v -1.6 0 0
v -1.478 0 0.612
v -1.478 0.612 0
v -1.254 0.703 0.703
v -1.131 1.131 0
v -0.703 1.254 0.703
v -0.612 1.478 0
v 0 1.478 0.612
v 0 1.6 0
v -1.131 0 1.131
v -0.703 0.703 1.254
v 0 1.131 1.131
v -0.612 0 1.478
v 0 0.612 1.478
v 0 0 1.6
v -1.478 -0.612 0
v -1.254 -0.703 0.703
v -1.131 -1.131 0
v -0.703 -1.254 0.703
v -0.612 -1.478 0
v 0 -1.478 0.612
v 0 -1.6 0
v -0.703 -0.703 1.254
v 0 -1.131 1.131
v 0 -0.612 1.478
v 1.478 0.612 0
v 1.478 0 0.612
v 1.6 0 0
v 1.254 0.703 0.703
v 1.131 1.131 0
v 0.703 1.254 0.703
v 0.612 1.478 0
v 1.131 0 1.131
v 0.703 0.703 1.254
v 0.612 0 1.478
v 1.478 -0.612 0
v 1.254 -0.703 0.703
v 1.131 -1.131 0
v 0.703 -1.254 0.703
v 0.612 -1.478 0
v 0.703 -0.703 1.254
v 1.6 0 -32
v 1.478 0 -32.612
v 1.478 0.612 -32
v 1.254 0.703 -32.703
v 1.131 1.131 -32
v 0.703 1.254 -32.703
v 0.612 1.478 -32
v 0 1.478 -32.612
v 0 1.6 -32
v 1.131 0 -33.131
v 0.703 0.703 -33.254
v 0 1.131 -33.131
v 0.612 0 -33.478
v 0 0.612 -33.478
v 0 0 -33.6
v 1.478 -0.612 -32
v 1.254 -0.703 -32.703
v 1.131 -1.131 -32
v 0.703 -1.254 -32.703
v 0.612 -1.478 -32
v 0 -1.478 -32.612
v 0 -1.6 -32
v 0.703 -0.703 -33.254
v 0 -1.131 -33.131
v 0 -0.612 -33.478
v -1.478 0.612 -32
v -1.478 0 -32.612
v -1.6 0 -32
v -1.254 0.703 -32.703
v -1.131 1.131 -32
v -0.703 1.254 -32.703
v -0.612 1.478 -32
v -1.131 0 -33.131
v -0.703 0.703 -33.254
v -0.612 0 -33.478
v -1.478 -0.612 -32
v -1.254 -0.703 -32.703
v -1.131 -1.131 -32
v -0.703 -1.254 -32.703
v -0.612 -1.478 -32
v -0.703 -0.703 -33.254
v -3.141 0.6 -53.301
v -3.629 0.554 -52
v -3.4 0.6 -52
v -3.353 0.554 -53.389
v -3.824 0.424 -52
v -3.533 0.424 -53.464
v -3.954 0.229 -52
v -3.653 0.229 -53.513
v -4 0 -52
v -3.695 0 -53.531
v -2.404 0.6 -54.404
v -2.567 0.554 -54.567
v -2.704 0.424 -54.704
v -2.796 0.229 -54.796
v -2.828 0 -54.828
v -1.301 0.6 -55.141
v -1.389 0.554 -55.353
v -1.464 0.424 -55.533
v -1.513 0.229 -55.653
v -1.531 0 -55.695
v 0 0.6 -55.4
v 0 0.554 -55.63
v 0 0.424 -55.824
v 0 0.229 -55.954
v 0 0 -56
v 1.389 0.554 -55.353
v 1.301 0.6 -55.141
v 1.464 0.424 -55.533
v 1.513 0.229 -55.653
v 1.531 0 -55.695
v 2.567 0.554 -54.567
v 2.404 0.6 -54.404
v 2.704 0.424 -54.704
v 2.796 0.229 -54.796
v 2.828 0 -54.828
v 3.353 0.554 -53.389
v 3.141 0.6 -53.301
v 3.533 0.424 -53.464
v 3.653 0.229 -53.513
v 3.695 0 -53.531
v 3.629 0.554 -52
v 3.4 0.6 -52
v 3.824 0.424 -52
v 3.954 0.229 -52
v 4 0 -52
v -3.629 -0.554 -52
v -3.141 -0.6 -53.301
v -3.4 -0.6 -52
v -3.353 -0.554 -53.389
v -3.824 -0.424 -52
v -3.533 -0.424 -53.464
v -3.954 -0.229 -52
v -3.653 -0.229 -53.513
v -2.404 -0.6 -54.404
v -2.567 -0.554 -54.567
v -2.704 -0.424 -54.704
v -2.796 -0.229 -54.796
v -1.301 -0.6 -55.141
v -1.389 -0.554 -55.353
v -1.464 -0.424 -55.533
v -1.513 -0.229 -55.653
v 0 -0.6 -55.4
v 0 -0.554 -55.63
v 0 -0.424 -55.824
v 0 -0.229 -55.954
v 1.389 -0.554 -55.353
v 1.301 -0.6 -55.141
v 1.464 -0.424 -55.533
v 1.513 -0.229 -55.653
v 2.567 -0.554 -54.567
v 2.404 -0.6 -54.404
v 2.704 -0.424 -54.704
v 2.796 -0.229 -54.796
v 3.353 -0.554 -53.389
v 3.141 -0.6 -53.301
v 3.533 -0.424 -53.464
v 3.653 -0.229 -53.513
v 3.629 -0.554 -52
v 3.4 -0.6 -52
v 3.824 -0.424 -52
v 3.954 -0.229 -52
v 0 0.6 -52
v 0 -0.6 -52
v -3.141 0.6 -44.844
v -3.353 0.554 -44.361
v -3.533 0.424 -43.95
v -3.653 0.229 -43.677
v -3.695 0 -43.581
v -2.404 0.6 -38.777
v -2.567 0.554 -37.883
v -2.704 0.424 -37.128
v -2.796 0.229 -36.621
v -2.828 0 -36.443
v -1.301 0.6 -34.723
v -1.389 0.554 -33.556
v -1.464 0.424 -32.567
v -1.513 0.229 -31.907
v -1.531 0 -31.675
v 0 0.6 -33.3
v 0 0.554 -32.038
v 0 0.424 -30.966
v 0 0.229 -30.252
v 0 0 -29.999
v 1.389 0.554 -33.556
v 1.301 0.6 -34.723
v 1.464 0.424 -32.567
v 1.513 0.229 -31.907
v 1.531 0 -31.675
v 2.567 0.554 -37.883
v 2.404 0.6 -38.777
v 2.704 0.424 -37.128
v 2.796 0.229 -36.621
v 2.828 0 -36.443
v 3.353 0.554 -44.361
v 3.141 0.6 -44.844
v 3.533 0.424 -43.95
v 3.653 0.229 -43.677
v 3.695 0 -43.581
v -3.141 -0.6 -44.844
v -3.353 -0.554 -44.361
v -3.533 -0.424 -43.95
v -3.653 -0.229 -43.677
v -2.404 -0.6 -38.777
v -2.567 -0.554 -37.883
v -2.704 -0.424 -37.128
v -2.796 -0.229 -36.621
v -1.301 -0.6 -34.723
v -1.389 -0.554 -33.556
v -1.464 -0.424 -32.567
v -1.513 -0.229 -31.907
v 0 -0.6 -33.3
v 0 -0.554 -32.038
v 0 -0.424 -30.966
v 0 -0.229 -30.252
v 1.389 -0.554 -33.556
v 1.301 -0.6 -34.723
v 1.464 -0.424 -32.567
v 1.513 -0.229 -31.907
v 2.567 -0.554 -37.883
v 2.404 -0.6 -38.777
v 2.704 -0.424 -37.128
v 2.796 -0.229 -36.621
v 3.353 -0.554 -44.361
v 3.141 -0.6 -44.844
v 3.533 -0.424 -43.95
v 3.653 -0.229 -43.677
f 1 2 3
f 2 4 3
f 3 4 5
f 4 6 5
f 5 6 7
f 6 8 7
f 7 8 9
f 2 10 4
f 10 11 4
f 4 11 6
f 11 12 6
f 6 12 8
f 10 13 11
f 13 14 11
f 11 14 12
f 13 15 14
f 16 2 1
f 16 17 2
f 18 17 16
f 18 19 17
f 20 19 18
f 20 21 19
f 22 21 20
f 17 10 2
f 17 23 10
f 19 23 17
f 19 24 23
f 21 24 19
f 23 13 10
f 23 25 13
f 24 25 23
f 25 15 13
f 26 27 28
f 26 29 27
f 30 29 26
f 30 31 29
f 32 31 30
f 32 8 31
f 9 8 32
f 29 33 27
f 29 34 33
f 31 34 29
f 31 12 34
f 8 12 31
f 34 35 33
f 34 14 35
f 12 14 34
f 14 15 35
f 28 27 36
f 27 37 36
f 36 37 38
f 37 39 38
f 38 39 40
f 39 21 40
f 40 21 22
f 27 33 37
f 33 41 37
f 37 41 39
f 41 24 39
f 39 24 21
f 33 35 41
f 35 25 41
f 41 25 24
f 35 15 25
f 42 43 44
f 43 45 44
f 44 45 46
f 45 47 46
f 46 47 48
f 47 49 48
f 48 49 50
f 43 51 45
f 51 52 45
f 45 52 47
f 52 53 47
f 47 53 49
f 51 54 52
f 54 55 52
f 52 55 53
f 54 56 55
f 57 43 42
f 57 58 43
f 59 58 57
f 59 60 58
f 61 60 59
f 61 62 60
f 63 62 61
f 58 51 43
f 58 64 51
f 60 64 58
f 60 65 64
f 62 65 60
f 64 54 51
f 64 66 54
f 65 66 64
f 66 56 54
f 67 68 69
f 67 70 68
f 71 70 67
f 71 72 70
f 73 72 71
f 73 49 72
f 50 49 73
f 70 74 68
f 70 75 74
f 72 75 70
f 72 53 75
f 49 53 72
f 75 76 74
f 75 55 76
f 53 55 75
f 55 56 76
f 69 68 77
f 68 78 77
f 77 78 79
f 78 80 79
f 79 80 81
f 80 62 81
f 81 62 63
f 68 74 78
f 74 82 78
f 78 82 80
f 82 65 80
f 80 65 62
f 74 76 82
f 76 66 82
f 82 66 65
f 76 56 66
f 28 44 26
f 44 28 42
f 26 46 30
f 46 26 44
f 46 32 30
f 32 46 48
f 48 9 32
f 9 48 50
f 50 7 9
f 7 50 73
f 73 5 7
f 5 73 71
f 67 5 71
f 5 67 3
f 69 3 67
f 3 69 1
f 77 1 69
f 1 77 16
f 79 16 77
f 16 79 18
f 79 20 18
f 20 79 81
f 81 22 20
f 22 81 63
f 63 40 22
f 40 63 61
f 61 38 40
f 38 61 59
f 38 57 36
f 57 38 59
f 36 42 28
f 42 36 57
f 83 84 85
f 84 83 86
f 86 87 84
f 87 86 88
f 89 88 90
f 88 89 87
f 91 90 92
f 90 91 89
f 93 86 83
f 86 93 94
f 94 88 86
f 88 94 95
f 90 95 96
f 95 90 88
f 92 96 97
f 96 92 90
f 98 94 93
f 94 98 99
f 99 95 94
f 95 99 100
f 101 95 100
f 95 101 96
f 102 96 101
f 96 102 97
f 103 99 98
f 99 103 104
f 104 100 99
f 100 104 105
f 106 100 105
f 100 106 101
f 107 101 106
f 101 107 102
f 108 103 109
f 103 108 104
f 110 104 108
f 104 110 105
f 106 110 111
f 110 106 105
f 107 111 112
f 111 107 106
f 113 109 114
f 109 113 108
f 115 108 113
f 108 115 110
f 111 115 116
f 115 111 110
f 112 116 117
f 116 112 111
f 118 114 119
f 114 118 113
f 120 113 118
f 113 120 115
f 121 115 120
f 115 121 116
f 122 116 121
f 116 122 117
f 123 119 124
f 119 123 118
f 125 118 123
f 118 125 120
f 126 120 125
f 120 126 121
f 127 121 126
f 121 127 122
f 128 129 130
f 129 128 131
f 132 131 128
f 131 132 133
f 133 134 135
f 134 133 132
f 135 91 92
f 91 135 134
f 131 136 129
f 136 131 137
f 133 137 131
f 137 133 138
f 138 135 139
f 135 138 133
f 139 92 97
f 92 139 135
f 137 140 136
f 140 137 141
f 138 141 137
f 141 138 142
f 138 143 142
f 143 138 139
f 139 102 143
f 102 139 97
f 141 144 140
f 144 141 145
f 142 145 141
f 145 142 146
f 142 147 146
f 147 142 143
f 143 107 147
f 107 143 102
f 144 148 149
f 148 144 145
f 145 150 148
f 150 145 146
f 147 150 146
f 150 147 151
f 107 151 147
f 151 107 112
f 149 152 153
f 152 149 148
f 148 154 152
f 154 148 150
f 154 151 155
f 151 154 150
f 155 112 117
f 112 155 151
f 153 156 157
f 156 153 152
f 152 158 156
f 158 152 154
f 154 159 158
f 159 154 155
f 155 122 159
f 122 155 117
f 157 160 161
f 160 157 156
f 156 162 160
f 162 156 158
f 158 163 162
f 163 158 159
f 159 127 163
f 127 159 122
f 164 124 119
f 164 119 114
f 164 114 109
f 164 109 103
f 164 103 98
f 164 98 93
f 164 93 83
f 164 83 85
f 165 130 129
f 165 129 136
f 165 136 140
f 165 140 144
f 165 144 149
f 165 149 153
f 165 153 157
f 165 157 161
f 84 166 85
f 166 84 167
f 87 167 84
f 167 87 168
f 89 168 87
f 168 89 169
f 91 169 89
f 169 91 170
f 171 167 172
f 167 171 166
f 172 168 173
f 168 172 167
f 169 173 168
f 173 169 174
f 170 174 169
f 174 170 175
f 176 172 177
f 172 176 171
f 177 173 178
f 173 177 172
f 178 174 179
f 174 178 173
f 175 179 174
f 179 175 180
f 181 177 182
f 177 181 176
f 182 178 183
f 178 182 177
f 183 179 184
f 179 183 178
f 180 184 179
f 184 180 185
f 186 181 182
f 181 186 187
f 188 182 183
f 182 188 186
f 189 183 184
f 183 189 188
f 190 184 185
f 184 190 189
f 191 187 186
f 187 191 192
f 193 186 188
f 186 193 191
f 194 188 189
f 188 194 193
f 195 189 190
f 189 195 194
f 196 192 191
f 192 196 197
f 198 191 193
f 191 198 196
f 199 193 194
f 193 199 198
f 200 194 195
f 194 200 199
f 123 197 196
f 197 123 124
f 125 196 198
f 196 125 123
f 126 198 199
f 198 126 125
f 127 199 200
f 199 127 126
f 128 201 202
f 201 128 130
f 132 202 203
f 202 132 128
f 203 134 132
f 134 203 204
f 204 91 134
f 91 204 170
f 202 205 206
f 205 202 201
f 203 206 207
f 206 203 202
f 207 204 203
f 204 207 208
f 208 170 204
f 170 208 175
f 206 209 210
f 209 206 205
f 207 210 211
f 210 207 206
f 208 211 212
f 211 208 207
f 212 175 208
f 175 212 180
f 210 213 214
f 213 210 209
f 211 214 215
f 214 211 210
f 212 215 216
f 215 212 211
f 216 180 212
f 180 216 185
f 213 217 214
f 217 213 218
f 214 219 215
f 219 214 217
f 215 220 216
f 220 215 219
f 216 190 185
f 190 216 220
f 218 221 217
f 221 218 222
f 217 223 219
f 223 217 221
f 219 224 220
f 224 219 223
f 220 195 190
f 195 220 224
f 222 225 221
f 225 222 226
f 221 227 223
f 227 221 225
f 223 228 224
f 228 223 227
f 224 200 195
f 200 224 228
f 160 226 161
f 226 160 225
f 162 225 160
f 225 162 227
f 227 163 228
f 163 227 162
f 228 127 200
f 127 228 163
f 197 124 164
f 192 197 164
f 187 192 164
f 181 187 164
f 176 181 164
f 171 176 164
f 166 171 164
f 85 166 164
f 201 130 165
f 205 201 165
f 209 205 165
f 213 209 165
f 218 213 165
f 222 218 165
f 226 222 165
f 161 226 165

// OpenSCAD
// file: ../p/1-8sphe.scad
use <../lib.scad>
function ldraw_lib__1_8sphe() = [
// 0 Sphere 0.125
// 0 Name: 1-8sphe.dat
// 0 Author: James Jessiman
// 0 !LDRAW_ORG Primitive UPDATE 2012-03
// 0 !LICENSE Licensed under CC BY 2.0 and CC BY 4.0 : see CAreadme.txt
// 
// 0 BFC CERTIFY CCW
  [0,"BFC","CERTIFY"],
  [0,"BFC","CCW"],
// 
// 0 !HISTORY 2000-08-01 {Axel Poque} fixes to resolve L3P error messages.
// 0 !HISTORY 2000-08-01 {Manfred Moolhuysen} fixes to resolve L3P error messages.
// 0 !HISTORY 2000-09-30 [PTadmin] Official Update 2000-02
// 0 !HISTORY 2002-03-28 [hafhead] Made BFC compliant
// 0 !HISTORY 2002-04-25 [PTadmin] Official Update 2002-02
// 0 !HISTORY 2007-06-22 [PTadmin] Header formatted for Contributor Agreement
// 0 !HISTORY 2008-07-01 [PTadmin] Official Update 2008-01
// 0 !HISTORY 2010-09-12 [MagFors] Changed winding, removed duplicated cond-line, optimized filesize
// 0 !HISTORY 2010-12-31 [PTadmin] Official Update 2010-03
// 0 !HISTORY 2012-07-01 [tcobbs] Replaced with geometry from LDView
// 0 !HISTORY 2012-12-28 [PTadmin] Official Update 2012-03
// 
// 
// 3 16 1 0 0 0.9239 0.3827 0 0.9239 0 0.3827
  [3,16,1,0,0,0.9239,0.3827,0,0.9239,0,0.3827],
// 3 16 0.9239 0.3827 0 0.7836 0.4393 0.4393 0.9239 0 0.3827
  [3,16,0.9239,0.3827,0,0.7836,0.4393,0.4393,0.9239,0,0.3827],
// 3 16 0.9239 0 0.3827 0.7836 0.4393 0.4393 0.7071 0 0.7071
  [3,16,0.9239,0,0.3827,0.7836,0.4393,0.4393,0.7071,0,0.7071],
// 3 16 0.7836 0.4393 0.4393 0.4393 0.4393 0.7836 0.7071 0 0.7071
  [3,16,0.7836,0.4393,0.4393,0.4393,0.4393,0.7836,0.7071,0,0.7071],
// 3 16 0.7071 0 0.7071 0.4393 0.4393 0.7836 0.3827 0 0.9239
  [3,16,0.7071,0,0.7071,0.4393,0.4393,0.7836,0.3827,0,0.9239],
// 3 16 0.4393 0.4393 0.7836 0 0.3827 0.9239 0.3827 0 0.9239
  [3,16,0.4393,0.4393,0.7836,0,0.3827,0.9239,0.3827,0,0.9239],
// 3 16 0.3827 0 0.9239 0 0.3827 0.9239 0 0 1
  [3,16,0.3827,0,0.9239,0,0.3827,0.9239,0,0,1],
// 3 16 0.9239 0.3827 0 0.7071 0.7071 0 0.7836 0.4393 0.4393
  [3,16,0.9239,0.3827,0,0.7071,0.7071,0,0.7836,0.4393,0.4393],
// 3 16 0.7071 0.7071 0 0.4393 0.7836 0.4393 0.7836 0.4393 0.4393
  [3,16,0.7071,0.7071,0,0.4393,0.7836,0.4393,0.7836,0.4393,0.4393],
// 3 16 0.7836 0.4393 0.4393 0.4393 0.7836 0.4393 0.4393 0.4393 0.7836
  [3,16,0.7836,0.4393,0.4393,0.4393,0.7836,0.4393,0.4393,0.4393,0.7836],
// 3 16 0.4393 0.7836 0.4393 0 0.7071 0.7071 0.4393 0.4393 0.7836
  [3,16,0.4393,0.7836,0.4393,0,0.7071,0.7071,0.4393,0.4393,0.7836],
// 3 16 0.4393 0.4393 0.7836 0 0.7071 0.7071 0 0.3827 0.9239
  [3,16,0.4393,0.4393,0.7836,0,0.7071,0.7071,0,0.3827,0.9239],
// 3 16 0.7071 0.7071 0 0.3827 0.9239 0 0.4393 0.7836 0.4393
  [3,16,0.7071,0.7071,0,0.3827,0.9239,0,0.4393,0.7836,0.4393],
// 3 16 0.3827 0.9239 0 0 0.9239 0.3827 0.4393 0.7836 0.4393
  [3,16,0.3827,0.9239,0,0,0.9239,0.3827,0.4393,0.7836,0.4393],
// 3 16 0.4393 0.7836 0.4393 0 0.9239 0.3827 0 0.7071 0.7071
  [3,16,0.4393,0.7836,0.4393,0,0.9239,0.3827,0,0.7071,0.7071],
// 3 16 0.3827 0.9239 0 0 1 0 0 0.9239 0.3827
  [3,16,0.3827,0.9239,0,0,1,0,0,0.9239,0.3827],
// 
// 5 24 1 0 0 0.9239 0.3827 0 1 0 -0.1 0.9239 0 0.3827
  [5,24,1,0,0,0.9239,0.3827,0,1,0,-0.1,0.9239,0,0.3827],
// 5 24 0.9239 0.3827 0 0.9239 0 0.3827 1 0 0 0.7836 0.4393 0.4393
  [5,24,0.9239,0.3827,0,0.9239,0,0.3827,1,0,0,0.7836,0.4393,0.4393],
// 5 24 1 0 0 0.9239 0 0.3827 0.9239 0.3827 0 1 -0.1 0
  [5,24,1,0,0,0.9239,0,0.3827,0.9239,0.3827,0,1,-0.1,0],
// 5 24 0.9239 0 0.3827 0.7836 0.4393 0.4393 0.9239 0.3827 0 0.7071 0 0.7071
  [5,24,0.9239,0,0.3827,0.7836,0.4393,0.4393,0.9239,0.3827,0,0.7071,0,0.7071],
// 5 24 0.7836 0.4393 0.4393 0.7071 0 0.7071 0.9239 0 0.3827 0.4393 0.4393 0.7836
  [5,24,0.7836,0.4393,0.4393,0.7071,0,0.7071,0.9239,0,0.3827,0.4393,0.4393,0.7836],
// 5 24 0.9239 0 0.3827 0.7071 0 0.7071 0.7836 0.4393 0.4393 0.9239 -0.1 0.3827
  [5,24,0.9239,0,0.3827,0.7071,0,0.7071,0.7836,0.4393,0.4393,0.9239,-0.1,0.3827],
// 5 24 0.7071 0 0.7071 0.4393 0.4393 0.7836 0.7836 0.4393 0.4393 0.3827 0 0.9239
  [5,24,0.7071,0,0.7071,0.4393,0.4393,0.7836,0.7836,0.4393,0.4393,0.3827,0,0.9239],
// 5 24 0.4393 0.4393 0.7836 0.3827 0 0.9239 0.7071 0 0.7071 0 0.3827 0.9239
  [5,24,0.4393,0.4393,0.7836,0.3827,0,0.9239,0.7071,0,0.7071,0,0.3827,0.9239],
// 5 24 0.7071 0 0.7071 0.3827 0 0.9239 0.4393 0.4393 0.7836 0.7071 -0.1 0.7071
  [5,24,0.7071,0,0.7071,0.3827,0,0.9239,0.4393,0.4393,0.7836,0.7071,-0.1,0.7071],
// 5 24 0.3827 0 0.9239 0 0.3827 0.9239 0.4393 0.4393 0.7836 0 0 1
  [5,24,0.3827,0,0.9239,0,0.3827,0.9239,0.4393,0.4393,0.7836,0,0,1],
// 5 24 0 0.3827 0.9239 0 0 1 0.3827 0 0.9239 -0.1 0.3827 0.9239
  [5,24,0,0.3827,0.9239,0,0,1,0.3827,0,0.9239,-0.1,0.3827,0.9239],
// 5 24 0.3827 0 0.9239 0 0 1 0 0.3827 0.9239 0.3827 -0.1 0.9239
  [5,24,0.3827,0,0.9239,0,0,1,0,0.3827,0.9239,0.3827,-0.1,0.9239],
// 5 24 0.9239 0.3827 0 0.7071 0.7071 0 0.9239 0.3827 -0.1 0.7836 0.4393 0.4393
  [5,24,0.9239,0.3827,0,0.7071,0.7071,0,0.9239,0.3827,-0.1,0.7836,0.4393,0.4393],
// 5 24 0.7071 0.7071 0 0.7836 0.4393 0.4393 0.9239 0.3827 0 0.4393 0.7836 0.4393
  [5,24,0.7071,0.7071,0,0.7836,0.4393,0.4393,0.9239,0.3827,0,0.4393,0.7836,0.4393],
// 5 24 0.9239 0.3827 0 0.7836 0.4393 0.4393 0.7071 0.7071 0 0.9239 0 0.3827
  [5,24,0.9239,0.3827,0,0.7836,0.4393,0.4393,0.7071,0.7071,0,0.9239,0,0.3827],
// 5 24 0.7836 0.4393 0.4393 0.4393 0.7836 0.4393 0.7071 0.7071 0 0.4393 0.4393 0.7836
  [5,24,0.7836,0.4393,0.4393,0.4393,0.7836,0.4393,0.7071,0.7071,0,0.4393,0.4393,0.7836],
// 5 24 0.4393 0.7836 0.4393 0.4393 0.4393 0.7836 0.7836 0.4393 0.4393 0 0.7071 0.7071
  [5,24,0.4393,0.7836,0.4393,0.4393,0.4393,0.7836,0.7836,0.4393,0.4393,0,0.7071,0.7071],
// 5 24 0.7836 0.4393 0.4393 0.4393 0.4393 0.7836 0.4393 0.7836 0.4393 0.7071 0 0.7071
  [5,24,0.7836,0.4393,0.4393,0.4393,0.4393,0.7836,0.4393,0.7836,0.4393,0.7071,0,0.7071],
// 5 24 0.4393 0.4393 0.7836 0 0.7071 0.7071 0.4393 0.7836 0.4393 0 0.3827 0.9239
  [5,24,0.4393,0.4393,0.7836,0,0.7071,0.7071,0.4393,0.7836,0.4393,0,0.3827,0.9239],
// 5 24 0 0.7071 0.7071 0 0.3827 0.9239 0.4393 0.4393 0.7836 -0.1 0.7071 0.7071
  [5,24,0,0.7071,0.7071,0,0.3827,0.9239,0.4393,0.4393,0.7836,-0.1,0.7071,0.7071],
// 5 24 0.4393 0.4393 0.7836 0 0.3827 0.9239 0 0.7071 0.7071 0.3827 0 0.9239
  [5,24,0.4393,0.4393,0.7836,0,0.3827,0.9239,0,0.7071,0.7071,0.3827,0,0.9239],
// 5 24 0.7071 0.7071 0 0.3827 0.9239 0 0.7071 0.7071 -0.1 0.4393 0.7836 0.4393
  [5,24,0.7071,0.7071,0,0.3827,0.9239,0,0.7071,0.7071,-0.1,0.4393,0.7836,0.4393],
// 5 24 0.3827 0.9239 0 0.4393 0.7836 0.4393 0.7071 0.7071 0 0 0.9239 0.3827
  [5,24,0.3827,0.9239,0,0.4393,0.7836,0.4393,0.7071,0.7071,0,0,0.9239,0.3827],
// 5 24 0.7071 0.7071 0 0.4393 0.7836 0.4393 0.3827 0.9239 0 0.7836 0.4393 0.4393
  [5,24,0.7071,0.7071,0,0.4393,0.7836,0.4393,0.3827,0.9239,0,0.7836,0.4393,0.4393],
// 5 24 0.4393 0.7836 0.4393 0 0.9239 0.3827 0.3827 0.9239 0 0 0.7071 0.7071
  [5,24,0.4393,0.7836,0.4393,0,0.9239,0.3827,0.3827,0.9239,0,0,0.7071,0.7071],
// 5 24 0 0.9239 0.3827 0 0.7071 0.7071 0.4393 0.7836 0.4393 -0.1 0.9239 0.3827
  [5,24,0,0.9239,0.3827,0,0.7071,0.7071,0.4393,0.7836,0.4393,-0.1,0.9239,0.3827],
// 5 24 0.4393 0.7836 0.4393 0 0.7071 0.7071 0 0.9239 0.3827 0.4393 0.4393 0.7836
  [5,24,0.4393,0.7836,0.4393,0,0.7071,0.7071,0,0.9239,0.3827,0.4393,0.4393,0.7836],
// 5 24 0.3827 0.9239 0 0 1 0 0.3827 0.9239 -0.1 0 0.9239 0.3827
  [5,24,0.3827,0.9239,0,0,1,0,0.3827,0.9239,-0.1,0,0.9239,0.3827],
// 5 24 0 1 0 0 0.9239 0.3827 0.3827 0.9239 0 -0.1 1 0
  [5,24,0,1,0,0,0.9239,0.3827,0.3827,0.9239,0,-0.1,1,0],
// 5 24 0.3827 0.9239 0 0 0.9239 0.3827 0 1 0 0.4393 0.7836 0.4393
  [5,24,0.3827,0.9239,0,0,0.9239,0.3827,0,1,0,0.4393,0.7836,0.4393],
];
module ldraw_lib__1_8sphe(step=0, col=false, unit=2/5, alt=false, line=0.2, solid=!$preview)
    makepoly(ldraw_lib__1_8sphe(), step=step, col=col, unit=unit, alt=alt, line=line, solid=solid);
ldraw_lib__1_8sphe(line=0.2);
// file: ../p/4-8sphe.scad
use <../lib.scad>
use <1-8sphe.scad>
function ldraw_lib__4_8sphe() = [
// 0 Sphere 0.5
// 0 Name: 4-8sphe.dat
// 0 Author: James Jessiman
// 0 !LDRAW_ORG Primitive UPDATE 2003-02
// 0 !LICENSE Licensed under CC BY 2.0 and CC BY 4.0 : see CAreadme.txt
// 
// 0 BFC CERTIFY CCW
  [0,"BFC","CERTIFY"],
  [0,"BFC","CCW"],
// 
// 0 !HISTORY 2002-08-31 [izanette] Modified with WINDZ for BFC compliance
// 0 !HISTORY 2003-08-01 [PTadmin] Official Update 2003-02
// 0 !HISTORY 2007-06-24 [PTadmin] Header formatted for Contributor Agreement
// 0 !HISTORY 2008-07-01 [PTadmin] Official Update 2008-01
// 
// 
// 1 16 0 0 0 1 0 0 0 1 0 0 0 1 1-8sphe.dat
  [1,16,0,0,0,1,0,0,0,1,0,0,0,1, ldraw_lib__1_8sphe()],
// 1 16 0 0 0 1 0 0 0 1 0 0 0 -1 1-8sphe.dat
  [1,16,0,0,0,1,0,0,0,1,0,0,0,-1, ldraw_lib__1_8sphe()],
// 1 16 0 0 0 -1 0 0 0 1 0 0 0 1 1-8sphe.dat
  [1,16,0,0,0,-1,0,0,0,1,0,0,0,1, ldraw_lib__1_8sphe()],
// 1 16 0 0 0 -1 0 0 0 1 0 0 0 -1 1-8sphe.dat
  [1,16,0,0,0,-1,0,0,0,1,0,0,0,-1, ldraw_lib__1_8sphe()],
// 0
// 
];
module ldraw_lib__4_8sphe(step=0, col=false, unit=2/5, alt=false, line=0.2, solid=!$preview)
    makepoly(ldraw_lib__4_8sphe(), step=step, col=col, unit=unit, alt=alt, line=line, solid=solid);
ldraw_lib__4_8sphe(line=0.2);
// file: ../p/4-4cyli.scad
use <../lib.scad>
function ldraw_lib__4_4cyli() = [
// 0 Cylinder 1.0
// 0 Name: 4-4cyli.dat
// 0 Author: James Jessiman
// 0 !LDRAW_ORG Primitive UPDATE 2005-01
// 0 !LICENSE Licensed under CC BY 2.0 and CC BY 4.0 : see CAreadme.txt
// 
// 0 BFC CERTIFY CCW
  [0,"BFC","CERTIFY"],
  [0,"BFC","CCW"],
// 
// 0 !HISTORY 1998-12-15 [PTadmin] Official Update 1998-10
// 0 !HISTORY 2002-03-23 [sbliss] Added BFC statement; merged headers from files in distributions LDraw 0.27 and Complete.
// 0 !HISTORY 2002-04-25 [PTadmin] Official Update 2002-02
// 0 !HISTORY 2004-12-14 [guyvivan] BFC CCW
// 0 !HISTORY 2005-12-28 [PTadmin] Official Update 2005-01
// 0 !HISTORY 2007-06-24 [PTadmin] Header formatted for Contributor Agreement
// 0 !HISTORY 2008-07-01 [PTadmin] Official Update 2008-01
// 
// 
// 4 16 1 1 0 0.9239 1 0.3827 0.9239 0 0.3827 1 0 0
  [4,16,1,1,0,0.9239,1,0.3827,0.9239,0,0.3827,1,0,0],
// 5 24 1 0 0 1 1 0 0.9239 0 0.3827 0.9239 0 -0.3827
  [5,24,1,0,0,1,1,0,0.9239,0,0.3827,0.9239,0,-0.3827],
// 4 16 0.9239 1 0.3827 0.7071 1 0.7071 0.7071 0 0.7071 0.9239 0 0.3827
  [4,16,0.9239,1,0.3827,0.7071,1,0.7071,0.7071,0,0.7071,0.9239,0,0.3827],
// 5 24 0.9239 0 0.3827 0.9239 1 0.3827 0.7071 0 0.7071 1 0 0
  [5,24,0.9239,0,0.3827,0.9239,1,0.3827,0.7071,0,0.7071,1,0,0],
// 4 16 0.7071 1 0.7071 0.3827 1 0.9239 0.3827 0 0.9239 0.7071 0 0.7071
  [4,16,0.7071,1,0.7071,0.3827,1,0.9239,0.3827,0,0.9239,0.7071,0,0.7071],
// 5 24 0.7071 0 0.7071 0.7071 1 0.7071 0.3827 0 0.9239 0.9239 0 0.3827
  [5,24,0.7071,0,0.7071,0.7071,1,0.7071,0.3827,0,0.9239,0.9239,0,0.3827],
// 4 16 0.3827 1 0.9239 0 1 1 0 0 1 0.3827 0 0.9239
  [4,16,0.3827,1,0.9239,0,1,1,0,0,1,0.3827,0,0.9239],
// 5 24 0.3827 0 0.9239 0.3827 1 0.9239 0 0 1 0.7071 0 0.7071
  [5,24,0.3827,0,0.9239,0.3827,1,0.9239,0,0,1,0.7071,0,0.7071],
// 4 16 0 1 1 -0.3827 1 0.9239 -0.3827 0 0.9239 0 0 1
  [4,16,0,1,1,-0.3827,1,0.9239,-0.3827,0,0.9239,0,0,1],
// 5 24 0 0 1 0 1 1 -0.3827 0 0.9239 0.3827 0 0.9239
  [5,24,0,0,1,0,1,1,-0.3827,0,0.9239,0.3827,0,0.9239],
// 4 16 -0.3827 1 0.9239 -0.7071 1 0.7071 -0.7071 0 0.7071 -0.3827 0 0.9239
  [4,16,-0.3827,1,0.9239,-0.7071,1,0.7071,-0.7071,0,0.7071,-0.3827,0,0.9239],
// 5 24 -0.3827 0 0.9239 -0.3827 1 0.9239 -0.7071 0 0.7071 0 0 1
  [5,24,-0.3827,0,0.9239,-0.3827,1,0.9239,-0.7071,0,0.7071,0,0,1],
// 4 16 -0.7071 1 0.7071 -0.9239 1 0.3827 -0.9239 0 0.3827 -0.7071 0 0.7071
  [4,16,-0.7071,1,0.7071,-0.9239,1,0.3827,-0.9239,0,0.3827,-0.7071,0,0.7071],
// 5 24 -0.7071 0 0.7071 -0.7071 1 0.7071 -0.9239 0 0.3827 -0.3827 0 0.9239
  [5,24,-0.7071,0,0.7071,-0.7071,1,0.7071,-0.9239,0,0.3827,-0.3827,0,0.9239],
// 4 16 -0.9239 1 0.3827 -1 1 0 -1 0 0 -0.9239 0 0.3827
  [4,16,-0.9239,1,0.3827,-1,1,0,-1,0,0,-0.9239,0,0.3827],
// 5 24 -0.9239 0 0.3827 -0.9239 1 0.3827 -1 0 0 -0.7071 0 0.7071
  [5,24,-0.9239,0,0.3827,-0.9239,1,0.3827,-1,0,0,-0.7071,0,0.7071],
// 4 16 -1 1 0 -0.9239 1 -0.3827 -0.9239 0 -0.3827 -1 0 0
  [4,16,-1,1,0,-0.9239,1,-0.3827,-0.9239,0,-0.3827,-1,0,0],
// 5 24 -1 0 0 -1 1 0 -0.9239 0 -0.3827 -0.9239 0 0.3827
  [5,24,-1,0,0,-1,1,0,-0.9239,0,-0.3827,-0.9239,0,0.3827],
// 4 16 -0.9239 1 -0.3827 -0.7071 1 -0.7071 -0.7071 0 -0.7071 -0.9239 0 -0.3827
  [4,16,-0.9239,1,-0.3827,-0.7071,1,-0.7071,-0.7071,0,-0.7071,-0.9239,0,-0.3827],
// 5 24 -0.9239 0 -0.3827 -0.9239 1 -0.3827 -0.7071 0 -0.7071 -1 0 0
  [5,24,-0.9239,0,-0.3827,-0.9239,1,-0.3827,-0.7071,0,-0.7071,-1,0,0],
// 4 16 -0.7071 1 -0.7071 -0.3827 1 -0.9239 -0.3827 0 -0.9239 -0.7071 0 -0.7071
  [4,16,-0.7071,1,-0.7071,-0.3827,1,-0.9239,-0.3827,0,-0.9239,-0.7071,0,-0.7071],
// 5 24 -0.7071 0 -0.7071 -0.7071 1 -0.7071 -0.3827 0 -0.9239 -0.9239 0 -0.3827
  [5,24,-0.7071,0,-0.7071,-0.7071,1,-0.7071,-0.3827,0,-0.9239,-0.9239,0,-0.3827],
// 4 16 -0.3827 1 -0.9239 0 1 -1 0 0 -1 -0.3827 0 -0.9239
  [4,16,-0.3827,1,-0.9239,0,1,-1,0,0,-1,-0.3827,0,-0.9239],
// 5 24 -0.3827 0 -0.9239 -0.3827 1 -0.9239 0 0 -1 -0.7071 0 -0.7071
  [5,24,-0.3827,0,-0.9239,-0.3827,1,-0.9239,0,0,-1,-0.7071,0,-0.7071],
// 4 16 0 1 -1 0.3827 1 -0.9239 0.3827 0 -0.9239 0 0 -1
  [4,16,0,1,-1,0.3827,1,-0.9239,0.3827,0,-0.9239,0,0,-1],
// 5 24 0 0 -1 0 1 -1 0.3827 0 -0.9239 -0.3827 0 -0.9239
  [5,24,0,0,-1,0,1,-1,0.3827,0,-0.9239,-0.3827,0,-0.9239],
// 4 16 0.3827 1 -0.9239 0.7071 1 -0.7071 0.7071 0 -0.7071 0.3827 0 -0.9239
  [4,16,0.3827,1,-0.9239,0.7071,1,-0.7071,0.7071,0,-0.7071,0.3827,0,-0.9239],
// 5 24 0.3827 0 -0.9239 0.3827 1 -0.9239 0.7071 0 -0.7071 0 0 -1
  [5,24,0.3827,0,-0.9239,0.3827,1,-0.9239,0.7071,0,-0.7071,0,0,-1],
// 4 16 0.7071 1 -0.7071 0.9239 1 -0.3827 0.9239 0 -0.3827 0.7071 0 -0.7071
  [4,16,0.7071,1,-0.7071,0.9239,1,-0.3827,0.9239,0,-0.3827,0.7071,0,-0.7071],
// 5 24 0.7071 0 -0.7071 0.7071 1 -0.7071 0.9239 0 -0.3827 0.3827 0 -0.9239
  [5,24,0.7071,0,-0.7071,0.7071,1,-0.7071,0.9239,0,-0.3827,0.3827,0,-0.9239],
// 4 16 0.9239 1 -0.3827 1 1 0 1 0 0 0.9239 0 -0.3827
  [4,16,0.9239,1,-0.3827,1,1,0,1,0,0,0.9239,0,-0.3827],
// 5 24 0.9239 0 -0.3827 0.9239 1 -0.3827 1 0 0 0.7071 0 -0.7071
  [5,24,0.9239,0,-0.3827,0.9239,1,-0.3827,1,0,0,0.7071,0,-0.7071],
// 0
];
module ldraw_lib__4_4cyli(step=0, col=false, unit=2/5, alt=false, line=0.2, solid=!$preview)
    makepoly(ldraw_lib__4_4cyli(), step=step, col=col, unit=unit, alt=alt, line=line, solid=solid);
ldraw_lib__4_4cyli(line=0.2);
// file: ../p/2-4disc.scad
use <../lib.scad>
function ldraw_lib__2_4disc() = [
// 0 Disc 0.5
// 0 Name: 2-4disc.dat
// 0 Author: James Jessiman
// 0 !LDRAW_ORG Primitive UPDATE 2002-02
// 0 !LICENSE Licensed under CC BY 4.0 : see CAreadme.txt
// 
// 0 BFC CERTIFY CCW
  [0,"BFC","CERTIFY"],
  [0,"BFC","CCW"],
// 
// 0 !HISTORY 1998-12-15 [PTadmin] Official Update 1998-10
// 0 !HISTORY 2002-03-23 [sbliss] Added BFC statement
// 0 !HISTORY 2002-04-25 [PTadmin] Official Update 2002-02
// 0 !HISTORY 2007-06-24 [PTadmin] Header formatted for Contributor Agreement
// 0 !HISTORY 2008-07-01 [PTadmin] Official Update 2008-01
// 
// 
// 3 16 0 0 0 1 0 0 0.9239 0 0.3827
  [3,16,0,0,0,1,0,0,0.9239,0,0.3827],
// 3 16 0 0 0 0.9239 0 0.3827 0.7071 0 0.7071
  [3,16,0,0,0,0.9239,0,0.3827,0.7071,0,0.7071],
// 3 16 0 0 0 0.7071 0 0.7071 0.3827 0 0.9239
  [3,16,0,0,0,0.7071,0,0.7071,0.3827,0,0.9239],
// 3 16 0 0 0 0.3827 0 0.9239 0 0 1
  [3,16,0,0,0,0.3827,0,0.9239,0,0,1],
// 3 16 0 0 0 0 0 1 -0.3827 0 0.9239
  [3,16,0,0,0,0,0,1,-0.3827,0,0.9239],
// 3 16 0 0 0 -0.3827 0 0.9239 -0.7071 0 0.7071
  [3,16,0,0,0,-0.3827,0,0.9239,-0.7071,0,0.7071],
// 3 16 0 0 0 -0.7071 0 0.7071 -0.9239 0 0.3827
  [3,16,0,0,0,-0.7071,0,0.7071,-0.9239,0,0.3827],
// 3 16 0 0 0 -0.9239 0 0.3827 -1 0 -0
  [3,16,0,0,0,-0.9239,0,0.3827,-1,0,-0],
// 0
];
module ldraw_lib__2_4disc(step=0, col=false, unit=2/5, alt=false, line=0.2, solid=!$preview)
    makepoly(ldraw_lib__2_4disc(), step=step, col=col, unit=unit, alt=alt, line=line, solid=solid);
ldraw_lib__2_4disc(line=0.2);
// main file
use <../lib.scad>
use <../p/2-4disc.scad>
use <../p/4-4cyli.scad>
use <../p/4-8sphe.scad>
use <../p/t04o1765.scad>
function ldraw_lib__2542() = [
// 0 Minifig Tool Oar
// 0 Name: 2542.dat
// 0 Author: Philippe Hurbain [Philo]
// 0 !LDRAW_ORG Part UPDATE 2012-03
// 0 !LICENSE Licensed under CC BY 4.0 : see CAreadme.txt
// 
// 0 BFC CERTIFY CW
  [0,"BFC","CERTIFY"],
  [0,"BFC","CW"],
// 
// 0 !CATEGORY Minifig Accessory
// 
// 0 !HISTORY 2009-05-02 [PTadmin] Official Update 2009-01
// 0 !HISTORY 2012-12-24 [cwdee] Add category
// 0 !HISTORY 2012-12-28 [PTadmin] Official Update 2012-03
// 
// 
// 1 16 0 0 0 -4 0 0 0 -4 0 0 0 4 4-8sphe.dat
  [1,16,0,0,0,-4,0,0,0,-4,0,0,0,4, ldraw_lib__4_8sphe()],
// 1 16 0 80 0 4 0 0 0 4 0 0 0 4 4-8sphe.dat
  [1,16,0,80,0,4,0,0,0,4,0,0,0,4, ldraw_lib__4_8sphe()],
// 1 16 0 0 0 4 0 0 0 80 0 0 0 4 4-4cyli.dat
  [1,16,0,0,0,4,0,0,0,80,0,0,0,4, ldraw_lib__4_4cyli()],
// 1 16 0 130 0 -8.5 0 0 0 0 8.5 0 8.5 0 t04o1765.dat
  [1,16,0,130,0,-8.5,0,0,0,0,8.5,0,8.5,0, ldraw_lib__t04o1765()],
// 1 16 0 130 0 0 0 8.5 8.5 0 0 0 8.5 0 t04o1765.dat
  [1,16,0,130,0,0,0,8.5,8.5,0,0,0,8.5,0, ldraw_lib__t04o1765()],
// 1 16 0 130 0 -8.5 0 0 0 0 8.5 0 -8.5 0 t04o1765.dat
  [1,16,0,130,0,-8.5,0,0,0,0,8.5,0,-8.5,0, ldraw_lib__t04o1765()],
// 1 16 0 130 0 0 0 8.5 8.5 0 0 0 -8.5 0 t04o1765.dat
  [1,16,0,130,0,0,0,8.5,8.5,0,0,0,-8.5,0, ldraw_lib__t04o1765()],
// 1 16 0 130 1.5 8.5 0 0 0 0 8.5 0 -1 0 2-4disc.dat
  [1,16,0,130,1.5,8.5,0,0,0,0,8.5,0,-1,0, ldraw_lib__2_4disc()],
// 1 16 0 130 -1.5 -8.5 0 0 0 0 8.5 0 1 0 2-4disc.dat
  [1,16,0,130,-1.5,-8.5,0,0,0,0,8.5,0,1,0, ldraw_lib__2_4disc()],
// 1 16 0 130 0 -8.5 0 0 0 0 -46.75 0 8.5 0 t04o1765.dat
  [1,16,0,130,0,-8.5,0,0,0,0,-46.75,0,8.5,0, ldraw_lib__t04o1765()],
// 1 16 0 130 0 0 0 8.5 -46.75 0 0 0 8.5 0 t04o1765.dat
  [1,16,0,130,0,0,0,8.5,-46.75,0,0,0,8.5,0, ldraw_lib__t04o1765()],
// 1 16 0 130 0 -8.5 0 0 0 0 -46.75 0 -8.5 0 t04o1765.dat
  [1,16,0,130,0,-8.5,0,0,0,0,-46.75,0,-8.5,0, ldraw_lib__t04o1765()],
// 1 16 0 130 0 0 0 8.5 -46.75 0 0 0 -8.5 0 t04o1765.dat
  [1,16,0,130,0,0,0,8.5,-46.75,0,0,0,-8.5,0, ldraw_lib__t04o1765()],
// 1 16 0 130 1.5 8.5 0 0 0 0 -46.75 0 -1 0 2-4disc.dat
  [1,16,0,130,1.5,8.5,0,0,0,0,-46.75,0,-1,0, ldraw_lib__2_4disc()],
// 1 16 0 130 -1.5 -8.5 0 0 0 0 -46.75 0 1 0 2-4disc.dat
  [1,16,0,130,-1.5,-8.5,0,0,0,0,-46.75,0,1,0, ldraw_lib__2_4disc()],
// 0 Intersection stick-paddle (Philo's Intersection Calculator)
// 2 24 1.45 83.4 1.45 1.53 83.38 1.44
  [2,24,1.45,83.4,1.45,1.53,83.38,1.44],
// 2 24 0.34 83.63 1.5 1.45 83.4 1.45
  [2,24,0.34,83.63,1.5,1.45,83.4,1.45],
// 2 24 0 83.7 1.5 0.34 83.63 1.5
  [2,24,0,83.7,1.5,0.34,83.63,1.5],
// 2 24 2.5 82.72 1.37 2.64 82.64 1.34
  [2,24,2.5,82.72,1.37,2.64,82.64,1.34],
// 2 24 1.53 83.38 1.44 2.44 82.76 1.39
  [2,24,1.53,83.38,1.44,2.44,82.76,1.39],
// 2 24 2.44 82.76 1.39 2.5 82.72 1.37
  [2,24,2.44,82.76,1.39,2.5,82.72,1.37],
// 2 24 3.46 81.53 1.1 3.24 81.84 1.17
  [2,24,3.46,81.53,1.1,3.24,81.84,1.17],
// 2 24 3.24 81.84 1.17 2.64 82.64 1.34
  [2,24,3.24,81.84,1.17,2.64,82.64,1.34],
// 2 24 3.72 80.58 0.82 3.7 80.68 0.85
  [2,24,3.72,80.58,0.82,3.7,80.68,0.85],
// 2 24 3.87 80.08 0.57 3.72 80.58 0.82
  [2,24,3.87,80.08,0.57,3.72,80.58,0.82],
// 2 24 3.87 80.08 0.56 3.87 80.08 0.57
  [2,24,3.87,80.08,0.56,3.87,80.08,0.57],
// 2 24 3.94 80 0.32 3.87 80.08 0.56
  [2,24,3.94,80,0.32,3.87,80.08,0.56],
// 2 24 3.5 81.36 1.08 3.46 81.53 1.1
  [2,24,3.5,81.36,1.08,3.46,81.53,1.1],
// 2 24 3.52 81.27 1.06 3.5 81.36 1.08
  [2,24,3.52,81.27,1.06,3.5,81.36,1.08],
// 2 24 3.7 80.68 0.85 3.52 81.27 1.06
  [2,24,3.7,80.68,0.85,3.52,81.27,1.06],
// 2 24 1.45 83.4 -1.45 1.53 83.38 -1.44
  [2,24,1.45,83.4,-1.45,1.53,83.38,-1.44],
// 2 24 0.34 83.63 -1.5 1.45 83.4 -1.45
  [2,24,0.34,83.63,-1.5,1.45,83.4,-1.45],
// 2 24 0 83.7 -1.5 0.34 83.63 -1.5
  [2,24,0,83.7,-1.5,0.34,83.63,-1.5],
// 2 24 2.5 82.72 -1.37 2.64 82.64 -1.34
  [2,24,2.5,82.72,-1.37,2.64,82.64,-1.34],
// 2 24 1.53 83.38 -1.44 2.44 82.76 -1.39
  [2,24,1.53,83.38,-1.44,2.44,82.76,-1.39],
// 2 24 2.44 82.76 -1.39 2.5 82.72 -1.37
  [2,24,2.44,82.76,-1.39,2.5,82.72,-1.37],
// 2 24 3.46 81.53 -1.1 3.24 81.84 -1.17
  [2,24,3.46,81.53,-1.1,3.24,81.84,-1.17],
// 2 24 3.24 81.84 -1.17 2.64 82.64 -1.34
  [2,24,3.24,81.84,-1.17,2.64,82.64,-1.34],
// 2 24 3.72 80.58 -0.82 3.7 80.68 -0.85
  [2,24,3.72,80.58,-0.82,3.7,80.68,-0.85],
// 2 24 3.87 80.08 -0.57 3.72 80.58 -0.82
  [2,24,3.87,80.08,-0.57,3.72,80.58,-0.82],
// 2 24 3.87 80.08 -0.57 3.87 80.08 -0.56
  [2,24,3.87,80.08,-0.57,3.87,80.08,-0.56],
// 2 24 3.87 80.08 -0.56 3.94 80 -0.32
  [2,24,3.87,80.08,-0.56,3.94,80,-0.32],
// 2 24 3.5 81.36 -1.08 3.46 81.53 -1.1
  [2,24,3.5,81.36,-1.08,3.46,81.53,-1.1],
// 2 24 3.52 81.27 -1.06 3.5 81.36 -1.08
  [2,24,3.52,81.27,-1.06,3.5,81.36,-1.08],
// 2 24 3.7 80.68 -0.85 3.52 81.27 -1.06
  [2,24,3.7,80.68,-0.85,3.52,81.27,-1.06],
// 2 24 -1.53 83.38 1.44 -1.45 83.4 1.45
  [2,24,-1.53,83.38,1.44,-1.45,83.4,1.45],
// 2 24 -1.45 83.4 1.45 -0.34 83.63 1.5
  [2,24,-1.45,83.4,1.45,-0.34,83.63,1.5],
// 2 24 -0.34 83.63 1.5 0 83.7 1.5
  [2,24,-0.34,83.63,1.5,0,83.7,1.5],
// 2 24 -2.64 82.64 1.34 -2.5 82.72 1.37
  [2,24,-2.64,82.64,1.34,-2.5,82.72,1.37],
// 2 24 -1.58 83.35 1.44 -1.53 83.38 1.44
  [2,24,-1.58,83.35,1.44,-1.53,83.38,1.44],
// 2 24 -2.44 82.76 1.39 -1.58 83.35 1.44
  [2,24,-2.44,82.76,1.39,-1.58,83.35,1.44],
// 2 24 -2.5 82.72 1.37 -2.44 82.76 1.39
  [2,24,-2.5,82.72,1.37,-2.44,82.76,1.39],
// 2 24 -3.46 81.53 1.1 -3.24 81.84 1.17
  [2,24,-3.46,81.53,1.1,-3.24,81.84,1.17],
// 2 24 -2.73 82.51 1.32 -2.64 82.64 1.34
  [2,24,-2.73,82.51,1.32,-2.64,82.64,1.34],
// 2 24 -3.24 81.84 1.17 -2.73 82.51 1.32
  [2,24,-3.24,81.84,1.17,-2.73,82.51,1.32],
// 2 24 -3.86 80.11 0.59 -3.72 80.58 0.82
  [2,24,-3.86,80.11,0.59,-3.72,80.58,0.82],
// 2 24 -3.87 80.08 0.57 -3.86 80.11 0.59
  [2,24,-3.87,80.08,0.57,-3.86,80.11,0.59],
// 2 24 -3.94 80 0.32 -3.87 80.08 0.57
  [2,24,-3.94,80,0.32,-3.87,80.08,0.57],
// 2 24 -3.72 80.58 0.82 -3.7 80.68 0.85
  [2,24,-3.72,80.58,0.82,-3.7,80.68,0.85],
// 2 24 -3.52 81.27 1.06 -3.46 81.53 1.1
  [2,24,-3.52,81.27,1.06,-3.46,81.53,1.1],
// 2 24 -3.7 80.68 0.85 -3.52 81.27 1.06
  [2,24,-3.7,80.68,0.85,-3.52,81.27,1.06],
// 2 24 -1.53 83.38 -1.44 -1.45 83.4 -1.45
  [2,24,-1.53,83.38,-1.44,-1.45,83.4,-1.45],
// 2 24 -1.45 83.4 -1.45 -0.34 83.63 -1.5
  [2,24,-1.45,83.4,-1.45,-0.34,83.63,-1.5],
// 2 24 -0.34 83.63 -1.5 0 83.7 -1.5
  [2,24,-0.34,83.63,-1.5,0,83.7,-1.5],
// 2 24 -2.64 82.64 -1.34 -2.5 82.72 -1.37
  [2,24,-2.64,82.64,-1.34,-2.5,82.72,-1.37],
// 2 24 -1.58 83.35 -1.44 -1.53 83.38 -1.44
  [2,24,-1.58,83.35,-1.44,-1.53,83.38,-1.44],
// 2 24 -2.44 82.76 -1.39 -1.58 83.35 -1.44
  [2,24,-2.44,82.76,-1.39,-1.58,83.35,-1.44],
// 2 24 -2.5 82.72 -1.37 -2.44 82.76 -1.39
  [2,24,-2.5,82.72,-1.37,-2.44,82.76,-1.39],
// 2 24 -3.46 81.53 -1.1 -3.24 81.84 -1.17
  [2,24,-3.46,81.53,-1.1,-3.24,81.84,-1.17],
// 2 24 -2.73 82.51 -1.32 -2.64 82.64 -1.34
  [2,24,-2.73,82.51,-1.32,-2.64,82.64,-1.34],
// 2 24 -3.24 81.84 -1.17 -2.73 82.51 -1.32
  [2,24,-3.24,81.84,-1.17,-2.73,82.51,-1.32],
// 2 24 -3.86 80.11 -0.59 -3.72 80.58 -0.82
  [2,24,-3.86,80.11,-0.59,-3.72,80.58,-0.82],
// 2 24 -3.87 80.08 -0.57 -3.86 80.11 -0.59
  [2,24,-3.87,80.08,-0.57,-3.86,80.11,-0.59],
// 2 24 -3.87 80.08 -0.57 -3.94 80 -0.32
  [2,24,-3.87,80.08,-0.57,-3.94,80,-0.32],
// 2 24 -3.72 80.58 -0.82 -3.7 80.68 -0.85
  [2,24,-3.72,80.58,-0.82,-3.7,80.68,-0.85],
// 2 24 -3.52 81.27 -1.06 -3.46 81.53 -1.1
  [2,24,-3.52,81.27,-1.06,-3.46,81.53,-1.1],
// 2 24 -3.7 80.68 -0.85 -3.52 81.27 -1.06
  [2,24,-3.7,80.68,-0.85,-3.52,81.27,-1.06],
// 2 24 4 79.82 0 3.94 80 0.32
  [2,24,4,79.82,0,3.94,80,0.32],
// 2 24 -3.99 79.84 0.03 -3.94 80 0.32
  [2,24,-3.99,79.84,0.03,-3.94,80,0.32],
// 2 24 -4 79.82 0 -3.99 79.84 0.03
  [2,24,-4,79.82,0,-3.99,79.84,0.03],
// 2 24 -3.94 80 -0.32 -3.99 79.84 -0.03
  [2,24,-3.94,80,-0.32,-3.99,79.84,-0.03],
// 2 24 -3.99 79.84 -0.03 -4 79.82 0
  [2,24,-3.99,79.84,-0.03,-4,79.82,0],
// 2 24 3.94 80 -0.32 4 79.82 0
  [2,24,3.94,80,-0.32,4,79.82,0],
// 0
];
module ldraw_lib__2542(step=0, col=false, unit=2/5, alt=false, line=0.2, solid=!$preview)
    makepoly(ldraw_lib__2542(), step=step, col=col, unit=unit, alt=alt, line=line, solid=solid);
ldraw_lib__2542(line=0.2);
